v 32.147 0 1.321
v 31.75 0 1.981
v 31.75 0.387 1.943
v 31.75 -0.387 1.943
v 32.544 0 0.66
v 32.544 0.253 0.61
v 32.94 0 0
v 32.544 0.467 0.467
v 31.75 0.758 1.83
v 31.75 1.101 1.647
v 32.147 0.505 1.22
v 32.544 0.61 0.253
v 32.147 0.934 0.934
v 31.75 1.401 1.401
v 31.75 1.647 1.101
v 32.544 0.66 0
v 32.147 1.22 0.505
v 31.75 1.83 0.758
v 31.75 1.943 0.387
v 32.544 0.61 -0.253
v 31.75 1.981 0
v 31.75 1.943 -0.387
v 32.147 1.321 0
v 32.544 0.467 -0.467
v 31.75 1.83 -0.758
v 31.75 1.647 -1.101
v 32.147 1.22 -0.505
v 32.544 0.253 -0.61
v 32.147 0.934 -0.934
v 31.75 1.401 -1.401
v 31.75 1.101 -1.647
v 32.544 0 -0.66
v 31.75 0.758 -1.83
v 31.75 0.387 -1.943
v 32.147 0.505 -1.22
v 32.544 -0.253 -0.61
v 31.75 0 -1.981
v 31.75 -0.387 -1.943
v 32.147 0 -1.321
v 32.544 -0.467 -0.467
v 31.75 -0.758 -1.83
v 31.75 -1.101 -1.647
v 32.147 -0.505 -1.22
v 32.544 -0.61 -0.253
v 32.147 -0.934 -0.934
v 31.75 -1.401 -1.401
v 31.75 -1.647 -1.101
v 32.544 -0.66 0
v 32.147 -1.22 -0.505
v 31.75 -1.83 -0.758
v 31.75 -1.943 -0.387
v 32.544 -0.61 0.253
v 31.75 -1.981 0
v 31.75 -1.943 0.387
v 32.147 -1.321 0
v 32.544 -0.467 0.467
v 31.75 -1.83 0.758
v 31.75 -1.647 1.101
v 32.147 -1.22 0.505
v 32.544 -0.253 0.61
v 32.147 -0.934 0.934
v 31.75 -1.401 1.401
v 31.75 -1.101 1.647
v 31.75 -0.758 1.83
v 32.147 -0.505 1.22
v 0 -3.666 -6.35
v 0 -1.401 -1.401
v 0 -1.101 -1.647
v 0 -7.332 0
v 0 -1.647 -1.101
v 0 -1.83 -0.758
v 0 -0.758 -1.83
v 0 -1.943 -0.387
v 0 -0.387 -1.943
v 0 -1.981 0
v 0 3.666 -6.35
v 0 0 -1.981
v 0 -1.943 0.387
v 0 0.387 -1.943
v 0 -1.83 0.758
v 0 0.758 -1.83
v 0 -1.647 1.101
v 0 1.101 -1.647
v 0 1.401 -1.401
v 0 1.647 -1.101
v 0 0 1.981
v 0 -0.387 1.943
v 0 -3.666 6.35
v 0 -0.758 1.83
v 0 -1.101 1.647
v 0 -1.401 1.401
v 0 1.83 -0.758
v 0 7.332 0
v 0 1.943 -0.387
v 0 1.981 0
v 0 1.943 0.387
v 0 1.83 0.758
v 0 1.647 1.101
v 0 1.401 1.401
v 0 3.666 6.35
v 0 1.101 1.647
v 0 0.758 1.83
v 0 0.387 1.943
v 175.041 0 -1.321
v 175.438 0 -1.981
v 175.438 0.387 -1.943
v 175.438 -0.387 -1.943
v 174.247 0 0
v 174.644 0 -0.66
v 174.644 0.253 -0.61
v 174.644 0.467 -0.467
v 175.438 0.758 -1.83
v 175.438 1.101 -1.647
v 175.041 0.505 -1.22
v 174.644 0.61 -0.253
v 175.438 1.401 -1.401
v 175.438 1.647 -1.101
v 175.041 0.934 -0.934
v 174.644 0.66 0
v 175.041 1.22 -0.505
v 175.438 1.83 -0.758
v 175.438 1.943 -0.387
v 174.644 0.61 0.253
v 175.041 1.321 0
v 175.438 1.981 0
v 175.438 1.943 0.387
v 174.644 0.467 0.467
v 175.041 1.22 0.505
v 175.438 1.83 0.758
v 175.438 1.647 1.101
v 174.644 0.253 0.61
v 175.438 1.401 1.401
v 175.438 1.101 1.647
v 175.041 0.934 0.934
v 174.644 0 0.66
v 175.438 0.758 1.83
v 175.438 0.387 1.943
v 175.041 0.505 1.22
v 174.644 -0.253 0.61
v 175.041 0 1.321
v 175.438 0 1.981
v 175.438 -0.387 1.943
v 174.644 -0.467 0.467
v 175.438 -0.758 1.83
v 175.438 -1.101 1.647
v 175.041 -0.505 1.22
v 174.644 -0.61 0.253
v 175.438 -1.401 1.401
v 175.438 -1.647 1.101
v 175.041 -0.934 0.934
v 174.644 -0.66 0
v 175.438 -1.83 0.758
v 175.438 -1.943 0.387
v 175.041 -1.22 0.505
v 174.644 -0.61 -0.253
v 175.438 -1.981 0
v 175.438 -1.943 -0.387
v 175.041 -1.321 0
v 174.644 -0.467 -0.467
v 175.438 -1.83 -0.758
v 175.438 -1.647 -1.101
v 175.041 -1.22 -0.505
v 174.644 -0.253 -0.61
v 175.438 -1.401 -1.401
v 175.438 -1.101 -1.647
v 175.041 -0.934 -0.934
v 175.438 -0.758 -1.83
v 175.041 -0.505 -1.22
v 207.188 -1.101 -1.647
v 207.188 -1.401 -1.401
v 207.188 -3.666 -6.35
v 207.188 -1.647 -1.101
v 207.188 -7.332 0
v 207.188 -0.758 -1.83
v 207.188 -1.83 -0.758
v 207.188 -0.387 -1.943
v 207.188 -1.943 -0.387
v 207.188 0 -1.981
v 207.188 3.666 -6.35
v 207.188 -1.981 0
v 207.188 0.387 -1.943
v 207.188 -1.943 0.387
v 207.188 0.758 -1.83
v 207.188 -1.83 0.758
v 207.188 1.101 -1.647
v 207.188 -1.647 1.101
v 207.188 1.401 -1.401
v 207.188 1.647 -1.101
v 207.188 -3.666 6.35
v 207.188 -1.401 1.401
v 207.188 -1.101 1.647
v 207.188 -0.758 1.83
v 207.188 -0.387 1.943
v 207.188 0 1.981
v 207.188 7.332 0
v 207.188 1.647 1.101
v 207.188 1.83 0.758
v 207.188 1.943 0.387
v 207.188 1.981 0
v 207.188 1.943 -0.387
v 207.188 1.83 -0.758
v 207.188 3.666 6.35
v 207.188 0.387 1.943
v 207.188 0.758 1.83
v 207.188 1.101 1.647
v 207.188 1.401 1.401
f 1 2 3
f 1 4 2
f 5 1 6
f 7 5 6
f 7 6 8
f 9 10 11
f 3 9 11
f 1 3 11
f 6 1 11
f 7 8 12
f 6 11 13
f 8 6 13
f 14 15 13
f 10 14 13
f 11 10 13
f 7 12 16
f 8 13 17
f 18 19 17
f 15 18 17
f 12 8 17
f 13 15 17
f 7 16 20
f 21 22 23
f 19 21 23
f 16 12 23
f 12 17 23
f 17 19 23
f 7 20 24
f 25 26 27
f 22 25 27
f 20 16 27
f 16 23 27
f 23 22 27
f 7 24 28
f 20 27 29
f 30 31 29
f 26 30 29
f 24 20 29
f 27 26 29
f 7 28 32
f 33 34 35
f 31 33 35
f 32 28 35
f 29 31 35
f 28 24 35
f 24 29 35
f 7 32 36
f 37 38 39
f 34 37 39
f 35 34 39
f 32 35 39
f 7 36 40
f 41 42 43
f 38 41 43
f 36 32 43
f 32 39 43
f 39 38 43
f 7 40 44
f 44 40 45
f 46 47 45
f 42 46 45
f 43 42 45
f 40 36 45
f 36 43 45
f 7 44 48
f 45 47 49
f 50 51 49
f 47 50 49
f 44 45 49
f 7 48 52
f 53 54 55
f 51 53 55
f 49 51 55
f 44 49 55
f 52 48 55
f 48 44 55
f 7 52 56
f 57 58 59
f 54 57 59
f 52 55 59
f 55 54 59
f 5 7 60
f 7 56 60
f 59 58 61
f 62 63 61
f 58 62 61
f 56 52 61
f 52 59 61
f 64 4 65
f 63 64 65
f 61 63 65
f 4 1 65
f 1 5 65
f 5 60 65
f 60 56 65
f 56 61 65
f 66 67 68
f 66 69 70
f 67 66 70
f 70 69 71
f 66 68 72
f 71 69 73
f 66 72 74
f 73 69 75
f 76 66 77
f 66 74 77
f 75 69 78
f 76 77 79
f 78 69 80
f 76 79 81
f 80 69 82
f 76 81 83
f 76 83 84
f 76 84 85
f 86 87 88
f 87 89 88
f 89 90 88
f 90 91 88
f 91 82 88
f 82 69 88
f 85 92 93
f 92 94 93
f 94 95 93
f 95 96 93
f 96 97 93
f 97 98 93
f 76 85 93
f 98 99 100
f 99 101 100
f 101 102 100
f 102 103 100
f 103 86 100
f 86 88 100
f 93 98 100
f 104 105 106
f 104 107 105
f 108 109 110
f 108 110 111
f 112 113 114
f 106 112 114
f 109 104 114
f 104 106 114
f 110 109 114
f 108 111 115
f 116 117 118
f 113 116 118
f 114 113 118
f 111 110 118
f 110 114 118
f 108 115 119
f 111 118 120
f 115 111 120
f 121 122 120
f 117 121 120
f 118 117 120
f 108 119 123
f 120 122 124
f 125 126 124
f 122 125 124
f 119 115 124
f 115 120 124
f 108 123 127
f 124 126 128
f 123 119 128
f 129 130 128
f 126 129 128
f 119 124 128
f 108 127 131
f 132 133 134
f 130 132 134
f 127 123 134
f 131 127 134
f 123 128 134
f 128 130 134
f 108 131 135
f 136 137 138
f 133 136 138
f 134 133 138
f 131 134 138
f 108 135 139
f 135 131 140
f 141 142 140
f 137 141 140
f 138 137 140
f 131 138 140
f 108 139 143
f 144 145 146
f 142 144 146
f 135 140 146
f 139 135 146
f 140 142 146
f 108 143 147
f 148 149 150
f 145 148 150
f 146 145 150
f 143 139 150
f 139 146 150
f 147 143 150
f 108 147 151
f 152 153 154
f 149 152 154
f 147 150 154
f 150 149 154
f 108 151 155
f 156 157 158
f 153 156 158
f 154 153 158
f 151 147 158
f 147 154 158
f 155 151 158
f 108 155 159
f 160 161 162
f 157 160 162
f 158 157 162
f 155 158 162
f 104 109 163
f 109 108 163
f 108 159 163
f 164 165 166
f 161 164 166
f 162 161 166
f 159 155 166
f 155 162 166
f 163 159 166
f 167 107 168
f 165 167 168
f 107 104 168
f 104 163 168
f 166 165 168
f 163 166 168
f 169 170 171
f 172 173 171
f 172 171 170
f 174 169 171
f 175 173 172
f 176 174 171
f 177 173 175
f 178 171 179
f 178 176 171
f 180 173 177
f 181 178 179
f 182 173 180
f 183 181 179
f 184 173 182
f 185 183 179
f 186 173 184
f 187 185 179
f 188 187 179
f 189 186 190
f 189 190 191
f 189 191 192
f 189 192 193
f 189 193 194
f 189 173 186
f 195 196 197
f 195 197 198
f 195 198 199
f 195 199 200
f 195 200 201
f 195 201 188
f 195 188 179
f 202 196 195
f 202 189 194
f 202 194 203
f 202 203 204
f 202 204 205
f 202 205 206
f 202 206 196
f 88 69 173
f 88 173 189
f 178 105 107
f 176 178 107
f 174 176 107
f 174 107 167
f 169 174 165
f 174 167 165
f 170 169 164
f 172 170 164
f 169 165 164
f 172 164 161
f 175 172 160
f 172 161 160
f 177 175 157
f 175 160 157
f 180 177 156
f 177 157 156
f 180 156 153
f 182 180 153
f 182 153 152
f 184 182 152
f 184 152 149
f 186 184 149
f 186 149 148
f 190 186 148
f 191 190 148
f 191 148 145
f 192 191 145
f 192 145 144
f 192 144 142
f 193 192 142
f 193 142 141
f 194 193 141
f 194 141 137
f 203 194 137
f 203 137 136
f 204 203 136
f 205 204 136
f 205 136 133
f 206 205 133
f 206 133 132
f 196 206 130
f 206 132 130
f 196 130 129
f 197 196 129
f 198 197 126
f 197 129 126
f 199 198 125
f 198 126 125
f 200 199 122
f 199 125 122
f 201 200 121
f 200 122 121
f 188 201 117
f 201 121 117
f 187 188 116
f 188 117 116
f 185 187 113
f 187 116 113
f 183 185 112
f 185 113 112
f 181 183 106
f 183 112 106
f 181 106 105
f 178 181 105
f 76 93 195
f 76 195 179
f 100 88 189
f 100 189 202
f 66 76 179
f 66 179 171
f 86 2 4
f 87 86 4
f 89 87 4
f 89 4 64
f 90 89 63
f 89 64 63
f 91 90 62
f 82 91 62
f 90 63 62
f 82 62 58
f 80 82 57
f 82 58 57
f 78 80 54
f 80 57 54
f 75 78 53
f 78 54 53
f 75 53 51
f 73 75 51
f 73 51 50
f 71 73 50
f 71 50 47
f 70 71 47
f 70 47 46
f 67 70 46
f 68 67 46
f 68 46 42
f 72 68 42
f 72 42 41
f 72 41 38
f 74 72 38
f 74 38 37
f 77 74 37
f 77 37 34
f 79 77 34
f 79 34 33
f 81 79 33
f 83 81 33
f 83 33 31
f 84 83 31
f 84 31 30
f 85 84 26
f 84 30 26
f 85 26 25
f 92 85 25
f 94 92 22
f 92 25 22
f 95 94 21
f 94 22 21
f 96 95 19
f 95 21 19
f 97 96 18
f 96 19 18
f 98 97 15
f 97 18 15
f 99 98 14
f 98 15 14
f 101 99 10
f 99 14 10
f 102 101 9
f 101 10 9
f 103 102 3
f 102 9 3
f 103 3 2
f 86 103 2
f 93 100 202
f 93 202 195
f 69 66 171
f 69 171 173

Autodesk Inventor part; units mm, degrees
ref_plane "YZ Plane" through (0, 0, 0) normal (1, 0, 0) x (0, 1, 0)
ref_plane "XZ Plane" through (0, 0, 0) normal (0, 1, 0) x (-1, 0, 0)
ref_plane "XY Plane" through (0, 0, 0) normal (0, 0, 1) x (1, 0, 0)
sketch "Sketch1" plane through (0, 0, 0) normal (1, 0, 0) x (0, 1, 0)
  line L0 (-3.6662, -6.35) -> (-7.3323, 0)
  line L1 (-7.3323, 0) -> (-3.6662, 6.35)
  line L2 (-3.6662, 6.35) -> (3.6662, 6.35)
  line L3 (3.6662, 6.35) -> (7.3323, 0)
  line L4 (7.3323, 0) -> (3.6662, -6.35)
  line L5 (3.6662, -6.35) -> (-3.6662, -6.35)
  point P0 (0, 0)
  point P1 (0, 0)
  dimension "d0" = 12.7
extrude "Extrusion1" add sketch "Sketch1" along normal blind 207.1878
sketch "Sketch2" plane through (0, 0, 0) normal (-1, 0, 0) x (0, 0, 1)
  point P0 (0, 0)
  point P1 (0, 0)
hole "Hole1" at (0, 0, 0) direction (1, 0, 0) diameter 3.9624 depth 31.75 tip angle 118 thread size "10-32 UNF" class "2B" standard "ANSI Unified Screw Threads"
sketch "Sketch3" plane through (207.1878, 0, 0) normal (1, 0, 0) x (0, 0, -1)
  circle A0 centre (0, 0) radius 1.9812 projected
hole "Hole2" at (207.1878, 0, 0) direction (-1, 0, 0) diameter 3.9624 depth 31.75 tip angle 118 thread size "10-32 UNF" class "2B" standard "ANSI Unified Screw Threads"
properties part number "STOCK,HEX,SHAFT,KICKER,BACK"
